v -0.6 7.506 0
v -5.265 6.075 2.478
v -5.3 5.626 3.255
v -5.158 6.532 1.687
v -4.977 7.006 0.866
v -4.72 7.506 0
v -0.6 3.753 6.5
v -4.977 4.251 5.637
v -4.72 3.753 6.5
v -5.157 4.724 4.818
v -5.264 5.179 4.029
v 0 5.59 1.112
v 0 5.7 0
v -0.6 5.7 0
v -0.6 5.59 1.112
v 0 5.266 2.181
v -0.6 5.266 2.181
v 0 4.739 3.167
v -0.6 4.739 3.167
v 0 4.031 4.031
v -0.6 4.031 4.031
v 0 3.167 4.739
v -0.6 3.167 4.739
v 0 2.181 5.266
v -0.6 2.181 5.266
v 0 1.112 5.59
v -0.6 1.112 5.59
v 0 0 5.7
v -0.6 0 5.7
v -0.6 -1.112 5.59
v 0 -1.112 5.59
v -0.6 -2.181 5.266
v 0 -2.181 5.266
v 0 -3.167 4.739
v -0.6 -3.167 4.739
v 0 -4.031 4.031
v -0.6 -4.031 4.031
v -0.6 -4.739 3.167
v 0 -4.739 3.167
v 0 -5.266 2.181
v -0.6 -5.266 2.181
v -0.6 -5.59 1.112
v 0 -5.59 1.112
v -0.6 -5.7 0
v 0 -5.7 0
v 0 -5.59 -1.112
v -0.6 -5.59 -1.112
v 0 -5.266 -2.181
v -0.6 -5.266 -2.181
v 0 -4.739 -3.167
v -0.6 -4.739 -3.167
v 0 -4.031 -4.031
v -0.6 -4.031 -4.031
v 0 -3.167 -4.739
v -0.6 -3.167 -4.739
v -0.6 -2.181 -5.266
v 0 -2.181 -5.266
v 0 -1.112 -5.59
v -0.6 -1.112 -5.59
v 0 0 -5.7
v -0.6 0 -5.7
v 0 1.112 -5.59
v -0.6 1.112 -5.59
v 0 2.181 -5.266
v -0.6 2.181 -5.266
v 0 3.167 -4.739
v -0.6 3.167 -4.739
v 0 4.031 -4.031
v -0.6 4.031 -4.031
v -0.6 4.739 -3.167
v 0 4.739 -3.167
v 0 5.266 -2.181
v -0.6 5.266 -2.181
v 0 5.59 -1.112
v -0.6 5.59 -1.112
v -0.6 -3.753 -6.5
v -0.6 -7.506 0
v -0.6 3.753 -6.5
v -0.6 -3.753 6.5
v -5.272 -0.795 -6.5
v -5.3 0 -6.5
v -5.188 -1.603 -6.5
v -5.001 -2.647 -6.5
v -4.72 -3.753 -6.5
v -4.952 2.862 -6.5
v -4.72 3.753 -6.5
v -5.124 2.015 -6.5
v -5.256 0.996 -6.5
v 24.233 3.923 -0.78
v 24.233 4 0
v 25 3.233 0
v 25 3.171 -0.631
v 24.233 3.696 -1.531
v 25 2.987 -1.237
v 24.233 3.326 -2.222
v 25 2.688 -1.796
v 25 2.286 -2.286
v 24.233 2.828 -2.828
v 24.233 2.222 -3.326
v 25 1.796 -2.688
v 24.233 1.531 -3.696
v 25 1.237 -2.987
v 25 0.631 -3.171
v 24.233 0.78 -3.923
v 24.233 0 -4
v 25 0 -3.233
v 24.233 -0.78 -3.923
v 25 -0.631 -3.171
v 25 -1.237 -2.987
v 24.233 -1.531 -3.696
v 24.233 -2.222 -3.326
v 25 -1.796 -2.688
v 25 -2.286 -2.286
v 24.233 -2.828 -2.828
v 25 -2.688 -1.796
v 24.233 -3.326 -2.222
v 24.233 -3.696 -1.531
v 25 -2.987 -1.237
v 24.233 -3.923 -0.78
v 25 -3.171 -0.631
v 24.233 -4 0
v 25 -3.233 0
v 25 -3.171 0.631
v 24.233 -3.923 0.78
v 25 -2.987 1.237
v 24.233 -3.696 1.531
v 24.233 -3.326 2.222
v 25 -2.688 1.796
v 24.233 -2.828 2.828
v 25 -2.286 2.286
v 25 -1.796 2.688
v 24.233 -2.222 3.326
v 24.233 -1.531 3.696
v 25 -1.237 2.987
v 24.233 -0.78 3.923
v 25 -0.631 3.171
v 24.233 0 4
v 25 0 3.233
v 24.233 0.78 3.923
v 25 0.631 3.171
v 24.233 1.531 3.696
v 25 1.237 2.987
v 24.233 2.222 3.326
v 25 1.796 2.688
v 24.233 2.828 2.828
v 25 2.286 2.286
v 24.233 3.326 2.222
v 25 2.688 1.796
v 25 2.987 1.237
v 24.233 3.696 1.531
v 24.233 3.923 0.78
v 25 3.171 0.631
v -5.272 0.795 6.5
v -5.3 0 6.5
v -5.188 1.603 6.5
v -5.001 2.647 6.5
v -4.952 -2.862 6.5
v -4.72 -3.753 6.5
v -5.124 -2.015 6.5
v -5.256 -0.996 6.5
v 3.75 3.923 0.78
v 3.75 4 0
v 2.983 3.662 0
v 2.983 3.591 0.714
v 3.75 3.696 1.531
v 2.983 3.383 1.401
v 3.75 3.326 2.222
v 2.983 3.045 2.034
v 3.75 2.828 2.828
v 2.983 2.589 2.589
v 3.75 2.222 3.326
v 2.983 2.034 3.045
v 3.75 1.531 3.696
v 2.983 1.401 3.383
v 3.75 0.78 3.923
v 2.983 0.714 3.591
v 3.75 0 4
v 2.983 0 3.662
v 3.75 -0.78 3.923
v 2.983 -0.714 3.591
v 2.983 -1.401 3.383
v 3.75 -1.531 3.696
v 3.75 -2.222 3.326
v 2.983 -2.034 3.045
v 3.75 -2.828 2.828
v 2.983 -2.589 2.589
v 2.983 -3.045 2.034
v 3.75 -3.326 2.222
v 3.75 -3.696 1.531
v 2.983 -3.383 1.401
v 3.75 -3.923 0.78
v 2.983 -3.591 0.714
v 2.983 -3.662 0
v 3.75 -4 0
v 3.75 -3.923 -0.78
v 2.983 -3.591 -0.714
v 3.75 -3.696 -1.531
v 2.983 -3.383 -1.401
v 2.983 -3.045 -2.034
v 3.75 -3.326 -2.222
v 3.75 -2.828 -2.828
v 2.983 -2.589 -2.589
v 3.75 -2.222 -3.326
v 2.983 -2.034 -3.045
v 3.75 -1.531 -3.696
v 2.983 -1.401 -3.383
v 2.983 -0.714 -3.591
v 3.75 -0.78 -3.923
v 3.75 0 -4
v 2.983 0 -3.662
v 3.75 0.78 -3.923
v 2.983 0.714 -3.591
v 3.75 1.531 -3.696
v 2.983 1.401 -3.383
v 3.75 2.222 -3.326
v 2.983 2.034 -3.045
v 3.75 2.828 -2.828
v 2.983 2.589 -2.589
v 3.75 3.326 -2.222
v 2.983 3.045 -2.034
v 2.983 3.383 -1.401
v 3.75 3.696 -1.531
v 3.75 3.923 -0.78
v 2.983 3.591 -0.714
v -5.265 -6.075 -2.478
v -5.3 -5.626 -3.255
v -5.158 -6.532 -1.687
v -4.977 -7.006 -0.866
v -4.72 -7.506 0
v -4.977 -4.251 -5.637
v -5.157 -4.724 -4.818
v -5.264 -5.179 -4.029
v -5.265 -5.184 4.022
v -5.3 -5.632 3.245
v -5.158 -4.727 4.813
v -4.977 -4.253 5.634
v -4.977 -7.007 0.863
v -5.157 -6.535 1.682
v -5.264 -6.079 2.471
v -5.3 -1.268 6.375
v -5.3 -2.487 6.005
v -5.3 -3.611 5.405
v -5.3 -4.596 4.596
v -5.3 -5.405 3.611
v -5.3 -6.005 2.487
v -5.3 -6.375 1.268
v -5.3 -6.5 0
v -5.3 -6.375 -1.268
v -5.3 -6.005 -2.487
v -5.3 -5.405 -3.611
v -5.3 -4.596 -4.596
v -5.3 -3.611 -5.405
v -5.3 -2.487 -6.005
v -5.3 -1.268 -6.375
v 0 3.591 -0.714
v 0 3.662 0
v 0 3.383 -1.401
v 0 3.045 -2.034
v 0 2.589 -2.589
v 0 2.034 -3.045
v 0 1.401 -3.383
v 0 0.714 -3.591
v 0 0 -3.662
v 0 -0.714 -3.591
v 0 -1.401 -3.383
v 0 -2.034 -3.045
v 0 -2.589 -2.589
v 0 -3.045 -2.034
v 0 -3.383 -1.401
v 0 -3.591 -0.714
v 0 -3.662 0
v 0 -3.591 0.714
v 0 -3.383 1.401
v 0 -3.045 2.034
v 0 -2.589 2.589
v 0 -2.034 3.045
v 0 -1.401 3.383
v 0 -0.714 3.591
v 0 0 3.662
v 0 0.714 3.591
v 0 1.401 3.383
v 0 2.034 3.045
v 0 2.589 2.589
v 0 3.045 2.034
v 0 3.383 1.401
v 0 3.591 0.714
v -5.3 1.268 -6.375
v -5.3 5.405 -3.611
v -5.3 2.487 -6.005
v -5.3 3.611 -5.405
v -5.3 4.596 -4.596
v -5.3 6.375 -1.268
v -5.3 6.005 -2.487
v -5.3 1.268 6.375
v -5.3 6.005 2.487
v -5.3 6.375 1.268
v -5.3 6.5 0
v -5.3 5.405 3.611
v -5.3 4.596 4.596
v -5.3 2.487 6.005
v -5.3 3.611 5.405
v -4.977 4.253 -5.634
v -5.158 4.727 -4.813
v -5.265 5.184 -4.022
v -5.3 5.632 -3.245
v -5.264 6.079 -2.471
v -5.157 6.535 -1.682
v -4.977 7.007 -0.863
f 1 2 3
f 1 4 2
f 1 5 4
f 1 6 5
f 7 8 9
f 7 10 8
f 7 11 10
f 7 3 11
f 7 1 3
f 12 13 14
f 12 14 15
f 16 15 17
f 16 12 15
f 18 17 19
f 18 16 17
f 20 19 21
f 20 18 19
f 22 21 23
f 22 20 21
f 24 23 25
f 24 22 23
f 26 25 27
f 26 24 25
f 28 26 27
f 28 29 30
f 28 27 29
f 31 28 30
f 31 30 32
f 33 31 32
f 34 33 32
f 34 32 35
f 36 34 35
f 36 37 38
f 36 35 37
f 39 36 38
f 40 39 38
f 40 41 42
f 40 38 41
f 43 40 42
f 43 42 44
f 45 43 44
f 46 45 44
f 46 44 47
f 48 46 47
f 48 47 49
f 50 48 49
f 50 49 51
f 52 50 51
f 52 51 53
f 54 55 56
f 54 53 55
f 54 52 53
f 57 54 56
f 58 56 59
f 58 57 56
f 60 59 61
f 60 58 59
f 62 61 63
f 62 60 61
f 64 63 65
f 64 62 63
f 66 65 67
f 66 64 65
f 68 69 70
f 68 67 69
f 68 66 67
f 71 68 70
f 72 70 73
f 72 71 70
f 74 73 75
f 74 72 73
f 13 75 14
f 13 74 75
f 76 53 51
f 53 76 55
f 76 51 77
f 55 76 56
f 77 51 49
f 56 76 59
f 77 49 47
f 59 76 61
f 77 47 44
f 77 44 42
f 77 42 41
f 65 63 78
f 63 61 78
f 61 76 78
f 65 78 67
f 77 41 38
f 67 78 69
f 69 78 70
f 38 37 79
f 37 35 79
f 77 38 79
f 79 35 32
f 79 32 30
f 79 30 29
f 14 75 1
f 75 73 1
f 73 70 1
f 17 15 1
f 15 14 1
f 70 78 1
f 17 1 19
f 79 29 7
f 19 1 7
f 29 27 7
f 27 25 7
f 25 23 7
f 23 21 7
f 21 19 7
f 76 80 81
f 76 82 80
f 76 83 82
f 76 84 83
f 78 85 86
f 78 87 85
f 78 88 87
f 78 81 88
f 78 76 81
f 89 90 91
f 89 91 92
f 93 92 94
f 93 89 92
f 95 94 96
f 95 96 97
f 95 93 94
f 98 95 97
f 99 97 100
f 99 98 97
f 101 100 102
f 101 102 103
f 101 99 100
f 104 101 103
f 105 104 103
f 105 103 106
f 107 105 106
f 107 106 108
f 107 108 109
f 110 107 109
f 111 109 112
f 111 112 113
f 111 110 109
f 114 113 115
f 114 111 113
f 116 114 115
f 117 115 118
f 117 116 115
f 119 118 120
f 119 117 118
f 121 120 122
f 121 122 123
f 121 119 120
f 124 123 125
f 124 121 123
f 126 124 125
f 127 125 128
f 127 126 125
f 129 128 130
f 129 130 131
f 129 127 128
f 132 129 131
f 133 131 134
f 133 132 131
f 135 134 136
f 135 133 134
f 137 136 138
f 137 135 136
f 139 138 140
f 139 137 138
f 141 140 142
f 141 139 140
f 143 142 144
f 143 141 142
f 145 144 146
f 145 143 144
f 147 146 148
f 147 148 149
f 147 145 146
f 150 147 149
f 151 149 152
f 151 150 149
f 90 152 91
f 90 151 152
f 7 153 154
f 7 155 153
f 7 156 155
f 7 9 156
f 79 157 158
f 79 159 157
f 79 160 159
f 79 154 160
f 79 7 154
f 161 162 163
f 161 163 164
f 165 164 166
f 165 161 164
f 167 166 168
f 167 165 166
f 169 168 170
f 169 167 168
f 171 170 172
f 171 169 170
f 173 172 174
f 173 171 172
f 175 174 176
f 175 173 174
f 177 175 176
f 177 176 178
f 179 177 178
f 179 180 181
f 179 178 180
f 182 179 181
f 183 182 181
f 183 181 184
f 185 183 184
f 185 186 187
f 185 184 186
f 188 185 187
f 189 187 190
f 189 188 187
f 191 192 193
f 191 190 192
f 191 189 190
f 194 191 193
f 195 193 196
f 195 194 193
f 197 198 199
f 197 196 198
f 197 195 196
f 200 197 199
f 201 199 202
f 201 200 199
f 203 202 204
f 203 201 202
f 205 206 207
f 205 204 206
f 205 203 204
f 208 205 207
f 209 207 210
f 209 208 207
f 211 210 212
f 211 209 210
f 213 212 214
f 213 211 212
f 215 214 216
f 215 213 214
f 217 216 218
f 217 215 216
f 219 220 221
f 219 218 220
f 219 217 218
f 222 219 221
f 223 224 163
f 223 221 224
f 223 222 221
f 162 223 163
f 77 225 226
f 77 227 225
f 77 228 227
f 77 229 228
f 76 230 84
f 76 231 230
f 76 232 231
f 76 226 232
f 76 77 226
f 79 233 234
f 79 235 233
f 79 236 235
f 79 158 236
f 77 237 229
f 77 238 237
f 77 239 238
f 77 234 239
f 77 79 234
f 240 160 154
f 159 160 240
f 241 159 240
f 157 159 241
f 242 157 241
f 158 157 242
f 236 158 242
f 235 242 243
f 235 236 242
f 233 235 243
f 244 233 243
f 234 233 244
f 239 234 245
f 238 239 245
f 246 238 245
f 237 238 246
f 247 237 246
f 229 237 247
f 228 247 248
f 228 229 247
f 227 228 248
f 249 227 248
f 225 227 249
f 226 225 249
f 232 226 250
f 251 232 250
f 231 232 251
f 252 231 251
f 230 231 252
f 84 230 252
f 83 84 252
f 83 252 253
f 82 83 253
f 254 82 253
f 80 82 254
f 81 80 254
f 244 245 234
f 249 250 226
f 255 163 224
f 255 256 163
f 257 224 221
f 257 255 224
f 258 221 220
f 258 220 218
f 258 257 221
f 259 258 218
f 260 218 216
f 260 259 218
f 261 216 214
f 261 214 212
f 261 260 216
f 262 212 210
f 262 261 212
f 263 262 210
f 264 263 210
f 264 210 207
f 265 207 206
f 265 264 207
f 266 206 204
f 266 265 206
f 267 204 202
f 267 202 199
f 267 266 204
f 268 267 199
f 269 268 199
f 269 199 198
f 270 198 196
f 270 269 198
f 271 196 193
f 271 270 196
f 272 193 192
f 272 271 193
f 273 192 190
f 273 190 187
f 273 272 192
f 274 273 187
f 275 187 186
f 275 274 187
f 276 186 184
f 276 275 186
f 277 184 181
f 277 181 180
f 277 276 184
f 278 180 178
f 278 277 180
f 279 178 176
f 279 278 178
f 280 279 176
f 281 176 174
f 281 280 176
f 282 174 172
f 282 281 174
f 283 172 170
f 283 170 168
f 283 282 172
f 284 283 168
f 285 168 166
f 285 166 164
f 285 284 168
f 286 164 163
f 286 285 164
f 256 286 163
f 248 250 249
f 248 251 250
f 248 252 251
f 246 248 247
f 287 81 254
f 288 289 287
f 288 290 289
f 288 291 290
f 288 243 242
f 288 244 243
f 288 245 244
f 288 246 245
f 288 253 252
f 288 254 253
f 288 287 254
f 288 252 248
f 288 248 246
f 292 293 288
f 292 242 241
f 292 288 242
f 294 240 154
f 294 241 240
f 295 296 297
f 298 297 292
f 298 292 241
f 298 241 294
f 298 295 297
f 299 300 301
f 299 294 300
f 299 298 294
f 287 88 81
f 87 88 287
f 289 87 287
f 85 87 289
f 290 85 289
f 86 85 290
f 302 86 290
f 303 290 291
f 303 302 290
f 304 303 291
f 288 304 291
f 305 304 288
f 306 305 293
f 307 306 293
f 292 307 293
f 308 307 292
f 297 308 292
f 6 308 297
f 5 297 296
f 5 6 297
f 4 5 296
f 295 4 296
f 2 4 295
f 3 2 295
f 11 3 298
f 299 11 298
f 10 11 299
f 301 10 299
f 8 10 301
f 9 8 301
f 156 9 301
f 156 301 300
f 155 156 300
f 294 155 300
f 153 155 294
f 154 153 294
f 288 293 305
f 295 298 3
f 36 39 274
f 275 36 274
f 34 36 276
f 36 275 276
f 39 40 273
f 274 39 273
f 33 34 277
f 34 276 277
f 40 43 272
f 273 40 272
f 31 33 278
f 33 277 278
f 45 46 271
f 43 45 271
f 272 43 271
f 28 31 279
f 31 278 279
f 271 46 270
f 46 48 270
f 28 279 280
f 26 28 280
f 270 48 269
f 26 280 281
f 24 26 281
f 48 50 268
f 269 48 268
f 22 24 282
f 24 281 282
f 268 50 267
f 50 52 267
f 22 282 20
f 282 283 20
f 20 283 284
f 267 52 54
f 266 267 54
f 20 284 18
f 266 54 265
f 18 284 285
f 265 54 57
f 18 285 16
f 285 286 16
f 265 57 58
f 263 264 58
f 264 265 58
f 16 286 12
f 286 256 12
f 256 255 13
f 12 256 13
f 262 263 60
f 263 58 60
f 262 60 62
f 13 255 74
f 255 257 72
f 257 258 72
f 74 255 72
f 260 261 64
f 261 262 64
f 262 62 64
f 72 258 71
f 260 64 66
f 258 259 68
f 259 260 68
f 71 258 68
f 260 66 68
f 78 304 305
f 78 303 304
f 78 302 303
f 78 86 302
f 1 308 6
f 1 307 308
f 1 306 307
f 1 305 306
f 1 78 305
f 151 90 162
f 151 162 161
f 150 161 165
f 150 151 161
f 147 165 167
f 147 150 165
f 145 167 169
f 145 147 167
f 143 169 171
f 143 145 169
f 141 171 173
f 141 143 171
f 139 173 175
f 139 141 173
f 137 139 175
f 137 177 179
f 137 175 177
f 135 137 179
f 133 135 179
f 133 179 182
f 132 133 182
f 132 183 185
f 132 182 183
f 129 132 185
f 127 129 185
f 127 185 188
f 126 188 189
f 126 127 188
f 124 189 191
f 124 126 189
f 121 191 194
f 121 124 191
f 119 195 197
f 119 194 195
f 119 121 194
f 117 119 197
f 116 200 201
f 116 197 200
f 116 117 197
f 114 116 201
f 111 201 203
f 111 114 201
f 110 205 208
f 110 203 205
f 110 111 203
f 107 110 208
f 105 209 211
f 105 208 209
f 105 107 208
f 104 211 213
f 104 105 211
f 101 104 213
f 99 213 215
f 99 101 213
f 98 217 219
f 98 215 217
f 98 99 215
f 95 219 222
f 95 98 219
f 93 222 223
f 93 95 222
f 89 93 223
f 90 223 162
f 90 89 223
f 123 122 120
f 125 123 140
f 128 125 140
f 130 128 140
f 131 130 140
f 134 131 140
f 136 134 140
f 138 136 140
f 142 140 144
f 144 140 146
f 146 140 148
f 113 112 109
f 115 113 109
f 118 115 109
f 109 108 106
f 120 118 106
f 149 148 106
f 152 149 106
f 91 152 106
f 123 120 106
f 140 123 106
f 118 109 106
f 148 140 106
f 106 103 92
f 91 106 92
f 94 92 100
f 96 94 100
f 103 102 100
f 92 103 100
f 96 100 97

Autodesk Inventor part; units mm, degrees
ref_plane "YZ Plane" through (0, 0, 0) normal (1, 0, 0) x (0, 1, 0)
ref_plane "XZ Plane" through (0, 0, 0) normal (0, 1, 0) x (-1, 0, 0)
ref_plane "XY Plane" through (0, 0, 0) normal (0, 0, 1) x (1, 0, 0)
sketch "Skizze1" plane through (0, 0, 0) normal (0, 0, 1) x (1, 0, 0)
  line L0 (0, 5.7) -> (0, 3.6617)
  line L1 (3.75, 4) -> (25, 4)
  line L2 (25, 4) -> (25, 0)
  line L3 (25, 0) -> (-0.6001, 0)
  line L4 (-0.4751, 0) -> (2.675, 0) projected
  line L5 (-0.6001, 0) -> (-0.6001, 5.7)
  line L6 (-0.6001, 5.7) -> (0, 5.7)
  line L7 (3.75, 4) -> (2.9831, 3.6617)
  line L8 (2.9831, 3.6617) -> (0, 3.6617)
  line L9 (0, -0.1135) -> (0, 1.4755) projected
  dimension "d0" = 25
  dimension "d1" = 21.25
  dimension "d2" = 8
  dimension "d9" = 0.6001
  dimension "d10" = 11.4
  dimension "d13" = 0.7669
  dimension "d14" = 7.3234
revolve "Körper" add sketch "Skizze1" angle 360 about axis through (25, 0, 0) along (-1, 0, 0)
sketch "Skizze2" plane through (-0.6001, 0, 0) normal (-1, 0, 0) x (0, 0, 1)
  line L0 (0, 7.5056) -> (6.5, 3.7528)
  line L1 (6.5, 3.7528) -> (6.5, -3.7528)
  line L2 (6.5, -3.7528) -> (0, -7.5056)
  line L3 (0, -7.5056) -> (-6.5, -3.7528)
  line L4 (-6.5, -3.7528) -> (-6.5, 3.7528)
  line L5 (-6.5, 3.7528) -> (0, 7.5056)
  point P0 (0, 0)
  point P1 (0, 0)
  dimension "d11" = 13
extrude "Kopf" add sketch "Skizze2" along normal blind 4.7
sketch "Skizze4" plane through (0, 0, 0) normal (0, 0, 1) x (1, 0, 0)
  line L0 (-5.3001, 6.5) -> (-5.3001, 7.5056)
  line L1 (-5.3001, 7.5056) -> (-4.7195, 7.5056)
  line L2 (-4.7195, 7.5056) -> (-5.3001, 6.5)
  line L3 (-1.1851, 0) -> (0.0049, 0) projected
  line L4 (-0.6001, 7.5056) -> (-5.3001, 7.5056) projected
  line L5 (-5.3001, 3.7528) -> (-5.3001, 7.5056) projected
  dimension "d5" = 30
  dimension "d19" = 13
revolve "Fase1" cut sketch "Skizze4" angle 360 about axis through (-10, 0, 0) along (1, 0, 0)
thread "Gewinde" size "M1.6x0.35" class "6g" standard "ANSI Metric M Profile" length 21.25
chamfer "Fase2" distance 0.7668 distance2 0.7669 1 edges at (25, -4, 0) measured on face at (25, 0.998, -0.8842)
equation "\"d0\" = NLG"
equation "\"d1\" = GEL"
equation "\"d2\" = GD"
equation "\"d10\" = SD2"
equation "\"d14\" = BDM"
equation "\"d11\" = SW"
equation "\"d3\" = KOH - SD"
equation "\"d5\" = ANG1"
equation "\"d19\" = SW0"
equation "\"d15\" = GEL"
equation "\"d6\" = -0.5 * SPD + 0.5 * GD"
equation "\"NLG\" = 25"
equation "\"GD\" = NND"
equation "\"BDM\" = 7.32342"
equation "\"KOH\" = 5.3"
equation "\"GEL\" = 21.25"
equation "\"SW\" = 13"
equation "\"SW0\" = 13"
equation "\"SPD\" = NND - 1.2269 * TPU"
equation "\"SD2\" = 11.4"
equation "\"SD\" = 0.6"
equation "\"ANG1\" = 30deg"
equation "\"GAL\" = 0.61345 * TPU"
equation "\"GUL\" = 0.61345 * TPU"
equation "\"RR\" = 0.4"
equation "\"d20\" = -NLG"
equation "\"TOA\" = 30deg"
equation "\"PTC\" = TPU"
equation "\"GD1\" = THREADDIA - 1.2269 * TPU"
equation "\"TPU\" = 1.25"
equation "\"THREADDIA\" = 8"
equation "\"E0\" = 1.155 * SW"
equation "\"NND\" = 8"
properties part number "DIN 933 - M8  x 25"
